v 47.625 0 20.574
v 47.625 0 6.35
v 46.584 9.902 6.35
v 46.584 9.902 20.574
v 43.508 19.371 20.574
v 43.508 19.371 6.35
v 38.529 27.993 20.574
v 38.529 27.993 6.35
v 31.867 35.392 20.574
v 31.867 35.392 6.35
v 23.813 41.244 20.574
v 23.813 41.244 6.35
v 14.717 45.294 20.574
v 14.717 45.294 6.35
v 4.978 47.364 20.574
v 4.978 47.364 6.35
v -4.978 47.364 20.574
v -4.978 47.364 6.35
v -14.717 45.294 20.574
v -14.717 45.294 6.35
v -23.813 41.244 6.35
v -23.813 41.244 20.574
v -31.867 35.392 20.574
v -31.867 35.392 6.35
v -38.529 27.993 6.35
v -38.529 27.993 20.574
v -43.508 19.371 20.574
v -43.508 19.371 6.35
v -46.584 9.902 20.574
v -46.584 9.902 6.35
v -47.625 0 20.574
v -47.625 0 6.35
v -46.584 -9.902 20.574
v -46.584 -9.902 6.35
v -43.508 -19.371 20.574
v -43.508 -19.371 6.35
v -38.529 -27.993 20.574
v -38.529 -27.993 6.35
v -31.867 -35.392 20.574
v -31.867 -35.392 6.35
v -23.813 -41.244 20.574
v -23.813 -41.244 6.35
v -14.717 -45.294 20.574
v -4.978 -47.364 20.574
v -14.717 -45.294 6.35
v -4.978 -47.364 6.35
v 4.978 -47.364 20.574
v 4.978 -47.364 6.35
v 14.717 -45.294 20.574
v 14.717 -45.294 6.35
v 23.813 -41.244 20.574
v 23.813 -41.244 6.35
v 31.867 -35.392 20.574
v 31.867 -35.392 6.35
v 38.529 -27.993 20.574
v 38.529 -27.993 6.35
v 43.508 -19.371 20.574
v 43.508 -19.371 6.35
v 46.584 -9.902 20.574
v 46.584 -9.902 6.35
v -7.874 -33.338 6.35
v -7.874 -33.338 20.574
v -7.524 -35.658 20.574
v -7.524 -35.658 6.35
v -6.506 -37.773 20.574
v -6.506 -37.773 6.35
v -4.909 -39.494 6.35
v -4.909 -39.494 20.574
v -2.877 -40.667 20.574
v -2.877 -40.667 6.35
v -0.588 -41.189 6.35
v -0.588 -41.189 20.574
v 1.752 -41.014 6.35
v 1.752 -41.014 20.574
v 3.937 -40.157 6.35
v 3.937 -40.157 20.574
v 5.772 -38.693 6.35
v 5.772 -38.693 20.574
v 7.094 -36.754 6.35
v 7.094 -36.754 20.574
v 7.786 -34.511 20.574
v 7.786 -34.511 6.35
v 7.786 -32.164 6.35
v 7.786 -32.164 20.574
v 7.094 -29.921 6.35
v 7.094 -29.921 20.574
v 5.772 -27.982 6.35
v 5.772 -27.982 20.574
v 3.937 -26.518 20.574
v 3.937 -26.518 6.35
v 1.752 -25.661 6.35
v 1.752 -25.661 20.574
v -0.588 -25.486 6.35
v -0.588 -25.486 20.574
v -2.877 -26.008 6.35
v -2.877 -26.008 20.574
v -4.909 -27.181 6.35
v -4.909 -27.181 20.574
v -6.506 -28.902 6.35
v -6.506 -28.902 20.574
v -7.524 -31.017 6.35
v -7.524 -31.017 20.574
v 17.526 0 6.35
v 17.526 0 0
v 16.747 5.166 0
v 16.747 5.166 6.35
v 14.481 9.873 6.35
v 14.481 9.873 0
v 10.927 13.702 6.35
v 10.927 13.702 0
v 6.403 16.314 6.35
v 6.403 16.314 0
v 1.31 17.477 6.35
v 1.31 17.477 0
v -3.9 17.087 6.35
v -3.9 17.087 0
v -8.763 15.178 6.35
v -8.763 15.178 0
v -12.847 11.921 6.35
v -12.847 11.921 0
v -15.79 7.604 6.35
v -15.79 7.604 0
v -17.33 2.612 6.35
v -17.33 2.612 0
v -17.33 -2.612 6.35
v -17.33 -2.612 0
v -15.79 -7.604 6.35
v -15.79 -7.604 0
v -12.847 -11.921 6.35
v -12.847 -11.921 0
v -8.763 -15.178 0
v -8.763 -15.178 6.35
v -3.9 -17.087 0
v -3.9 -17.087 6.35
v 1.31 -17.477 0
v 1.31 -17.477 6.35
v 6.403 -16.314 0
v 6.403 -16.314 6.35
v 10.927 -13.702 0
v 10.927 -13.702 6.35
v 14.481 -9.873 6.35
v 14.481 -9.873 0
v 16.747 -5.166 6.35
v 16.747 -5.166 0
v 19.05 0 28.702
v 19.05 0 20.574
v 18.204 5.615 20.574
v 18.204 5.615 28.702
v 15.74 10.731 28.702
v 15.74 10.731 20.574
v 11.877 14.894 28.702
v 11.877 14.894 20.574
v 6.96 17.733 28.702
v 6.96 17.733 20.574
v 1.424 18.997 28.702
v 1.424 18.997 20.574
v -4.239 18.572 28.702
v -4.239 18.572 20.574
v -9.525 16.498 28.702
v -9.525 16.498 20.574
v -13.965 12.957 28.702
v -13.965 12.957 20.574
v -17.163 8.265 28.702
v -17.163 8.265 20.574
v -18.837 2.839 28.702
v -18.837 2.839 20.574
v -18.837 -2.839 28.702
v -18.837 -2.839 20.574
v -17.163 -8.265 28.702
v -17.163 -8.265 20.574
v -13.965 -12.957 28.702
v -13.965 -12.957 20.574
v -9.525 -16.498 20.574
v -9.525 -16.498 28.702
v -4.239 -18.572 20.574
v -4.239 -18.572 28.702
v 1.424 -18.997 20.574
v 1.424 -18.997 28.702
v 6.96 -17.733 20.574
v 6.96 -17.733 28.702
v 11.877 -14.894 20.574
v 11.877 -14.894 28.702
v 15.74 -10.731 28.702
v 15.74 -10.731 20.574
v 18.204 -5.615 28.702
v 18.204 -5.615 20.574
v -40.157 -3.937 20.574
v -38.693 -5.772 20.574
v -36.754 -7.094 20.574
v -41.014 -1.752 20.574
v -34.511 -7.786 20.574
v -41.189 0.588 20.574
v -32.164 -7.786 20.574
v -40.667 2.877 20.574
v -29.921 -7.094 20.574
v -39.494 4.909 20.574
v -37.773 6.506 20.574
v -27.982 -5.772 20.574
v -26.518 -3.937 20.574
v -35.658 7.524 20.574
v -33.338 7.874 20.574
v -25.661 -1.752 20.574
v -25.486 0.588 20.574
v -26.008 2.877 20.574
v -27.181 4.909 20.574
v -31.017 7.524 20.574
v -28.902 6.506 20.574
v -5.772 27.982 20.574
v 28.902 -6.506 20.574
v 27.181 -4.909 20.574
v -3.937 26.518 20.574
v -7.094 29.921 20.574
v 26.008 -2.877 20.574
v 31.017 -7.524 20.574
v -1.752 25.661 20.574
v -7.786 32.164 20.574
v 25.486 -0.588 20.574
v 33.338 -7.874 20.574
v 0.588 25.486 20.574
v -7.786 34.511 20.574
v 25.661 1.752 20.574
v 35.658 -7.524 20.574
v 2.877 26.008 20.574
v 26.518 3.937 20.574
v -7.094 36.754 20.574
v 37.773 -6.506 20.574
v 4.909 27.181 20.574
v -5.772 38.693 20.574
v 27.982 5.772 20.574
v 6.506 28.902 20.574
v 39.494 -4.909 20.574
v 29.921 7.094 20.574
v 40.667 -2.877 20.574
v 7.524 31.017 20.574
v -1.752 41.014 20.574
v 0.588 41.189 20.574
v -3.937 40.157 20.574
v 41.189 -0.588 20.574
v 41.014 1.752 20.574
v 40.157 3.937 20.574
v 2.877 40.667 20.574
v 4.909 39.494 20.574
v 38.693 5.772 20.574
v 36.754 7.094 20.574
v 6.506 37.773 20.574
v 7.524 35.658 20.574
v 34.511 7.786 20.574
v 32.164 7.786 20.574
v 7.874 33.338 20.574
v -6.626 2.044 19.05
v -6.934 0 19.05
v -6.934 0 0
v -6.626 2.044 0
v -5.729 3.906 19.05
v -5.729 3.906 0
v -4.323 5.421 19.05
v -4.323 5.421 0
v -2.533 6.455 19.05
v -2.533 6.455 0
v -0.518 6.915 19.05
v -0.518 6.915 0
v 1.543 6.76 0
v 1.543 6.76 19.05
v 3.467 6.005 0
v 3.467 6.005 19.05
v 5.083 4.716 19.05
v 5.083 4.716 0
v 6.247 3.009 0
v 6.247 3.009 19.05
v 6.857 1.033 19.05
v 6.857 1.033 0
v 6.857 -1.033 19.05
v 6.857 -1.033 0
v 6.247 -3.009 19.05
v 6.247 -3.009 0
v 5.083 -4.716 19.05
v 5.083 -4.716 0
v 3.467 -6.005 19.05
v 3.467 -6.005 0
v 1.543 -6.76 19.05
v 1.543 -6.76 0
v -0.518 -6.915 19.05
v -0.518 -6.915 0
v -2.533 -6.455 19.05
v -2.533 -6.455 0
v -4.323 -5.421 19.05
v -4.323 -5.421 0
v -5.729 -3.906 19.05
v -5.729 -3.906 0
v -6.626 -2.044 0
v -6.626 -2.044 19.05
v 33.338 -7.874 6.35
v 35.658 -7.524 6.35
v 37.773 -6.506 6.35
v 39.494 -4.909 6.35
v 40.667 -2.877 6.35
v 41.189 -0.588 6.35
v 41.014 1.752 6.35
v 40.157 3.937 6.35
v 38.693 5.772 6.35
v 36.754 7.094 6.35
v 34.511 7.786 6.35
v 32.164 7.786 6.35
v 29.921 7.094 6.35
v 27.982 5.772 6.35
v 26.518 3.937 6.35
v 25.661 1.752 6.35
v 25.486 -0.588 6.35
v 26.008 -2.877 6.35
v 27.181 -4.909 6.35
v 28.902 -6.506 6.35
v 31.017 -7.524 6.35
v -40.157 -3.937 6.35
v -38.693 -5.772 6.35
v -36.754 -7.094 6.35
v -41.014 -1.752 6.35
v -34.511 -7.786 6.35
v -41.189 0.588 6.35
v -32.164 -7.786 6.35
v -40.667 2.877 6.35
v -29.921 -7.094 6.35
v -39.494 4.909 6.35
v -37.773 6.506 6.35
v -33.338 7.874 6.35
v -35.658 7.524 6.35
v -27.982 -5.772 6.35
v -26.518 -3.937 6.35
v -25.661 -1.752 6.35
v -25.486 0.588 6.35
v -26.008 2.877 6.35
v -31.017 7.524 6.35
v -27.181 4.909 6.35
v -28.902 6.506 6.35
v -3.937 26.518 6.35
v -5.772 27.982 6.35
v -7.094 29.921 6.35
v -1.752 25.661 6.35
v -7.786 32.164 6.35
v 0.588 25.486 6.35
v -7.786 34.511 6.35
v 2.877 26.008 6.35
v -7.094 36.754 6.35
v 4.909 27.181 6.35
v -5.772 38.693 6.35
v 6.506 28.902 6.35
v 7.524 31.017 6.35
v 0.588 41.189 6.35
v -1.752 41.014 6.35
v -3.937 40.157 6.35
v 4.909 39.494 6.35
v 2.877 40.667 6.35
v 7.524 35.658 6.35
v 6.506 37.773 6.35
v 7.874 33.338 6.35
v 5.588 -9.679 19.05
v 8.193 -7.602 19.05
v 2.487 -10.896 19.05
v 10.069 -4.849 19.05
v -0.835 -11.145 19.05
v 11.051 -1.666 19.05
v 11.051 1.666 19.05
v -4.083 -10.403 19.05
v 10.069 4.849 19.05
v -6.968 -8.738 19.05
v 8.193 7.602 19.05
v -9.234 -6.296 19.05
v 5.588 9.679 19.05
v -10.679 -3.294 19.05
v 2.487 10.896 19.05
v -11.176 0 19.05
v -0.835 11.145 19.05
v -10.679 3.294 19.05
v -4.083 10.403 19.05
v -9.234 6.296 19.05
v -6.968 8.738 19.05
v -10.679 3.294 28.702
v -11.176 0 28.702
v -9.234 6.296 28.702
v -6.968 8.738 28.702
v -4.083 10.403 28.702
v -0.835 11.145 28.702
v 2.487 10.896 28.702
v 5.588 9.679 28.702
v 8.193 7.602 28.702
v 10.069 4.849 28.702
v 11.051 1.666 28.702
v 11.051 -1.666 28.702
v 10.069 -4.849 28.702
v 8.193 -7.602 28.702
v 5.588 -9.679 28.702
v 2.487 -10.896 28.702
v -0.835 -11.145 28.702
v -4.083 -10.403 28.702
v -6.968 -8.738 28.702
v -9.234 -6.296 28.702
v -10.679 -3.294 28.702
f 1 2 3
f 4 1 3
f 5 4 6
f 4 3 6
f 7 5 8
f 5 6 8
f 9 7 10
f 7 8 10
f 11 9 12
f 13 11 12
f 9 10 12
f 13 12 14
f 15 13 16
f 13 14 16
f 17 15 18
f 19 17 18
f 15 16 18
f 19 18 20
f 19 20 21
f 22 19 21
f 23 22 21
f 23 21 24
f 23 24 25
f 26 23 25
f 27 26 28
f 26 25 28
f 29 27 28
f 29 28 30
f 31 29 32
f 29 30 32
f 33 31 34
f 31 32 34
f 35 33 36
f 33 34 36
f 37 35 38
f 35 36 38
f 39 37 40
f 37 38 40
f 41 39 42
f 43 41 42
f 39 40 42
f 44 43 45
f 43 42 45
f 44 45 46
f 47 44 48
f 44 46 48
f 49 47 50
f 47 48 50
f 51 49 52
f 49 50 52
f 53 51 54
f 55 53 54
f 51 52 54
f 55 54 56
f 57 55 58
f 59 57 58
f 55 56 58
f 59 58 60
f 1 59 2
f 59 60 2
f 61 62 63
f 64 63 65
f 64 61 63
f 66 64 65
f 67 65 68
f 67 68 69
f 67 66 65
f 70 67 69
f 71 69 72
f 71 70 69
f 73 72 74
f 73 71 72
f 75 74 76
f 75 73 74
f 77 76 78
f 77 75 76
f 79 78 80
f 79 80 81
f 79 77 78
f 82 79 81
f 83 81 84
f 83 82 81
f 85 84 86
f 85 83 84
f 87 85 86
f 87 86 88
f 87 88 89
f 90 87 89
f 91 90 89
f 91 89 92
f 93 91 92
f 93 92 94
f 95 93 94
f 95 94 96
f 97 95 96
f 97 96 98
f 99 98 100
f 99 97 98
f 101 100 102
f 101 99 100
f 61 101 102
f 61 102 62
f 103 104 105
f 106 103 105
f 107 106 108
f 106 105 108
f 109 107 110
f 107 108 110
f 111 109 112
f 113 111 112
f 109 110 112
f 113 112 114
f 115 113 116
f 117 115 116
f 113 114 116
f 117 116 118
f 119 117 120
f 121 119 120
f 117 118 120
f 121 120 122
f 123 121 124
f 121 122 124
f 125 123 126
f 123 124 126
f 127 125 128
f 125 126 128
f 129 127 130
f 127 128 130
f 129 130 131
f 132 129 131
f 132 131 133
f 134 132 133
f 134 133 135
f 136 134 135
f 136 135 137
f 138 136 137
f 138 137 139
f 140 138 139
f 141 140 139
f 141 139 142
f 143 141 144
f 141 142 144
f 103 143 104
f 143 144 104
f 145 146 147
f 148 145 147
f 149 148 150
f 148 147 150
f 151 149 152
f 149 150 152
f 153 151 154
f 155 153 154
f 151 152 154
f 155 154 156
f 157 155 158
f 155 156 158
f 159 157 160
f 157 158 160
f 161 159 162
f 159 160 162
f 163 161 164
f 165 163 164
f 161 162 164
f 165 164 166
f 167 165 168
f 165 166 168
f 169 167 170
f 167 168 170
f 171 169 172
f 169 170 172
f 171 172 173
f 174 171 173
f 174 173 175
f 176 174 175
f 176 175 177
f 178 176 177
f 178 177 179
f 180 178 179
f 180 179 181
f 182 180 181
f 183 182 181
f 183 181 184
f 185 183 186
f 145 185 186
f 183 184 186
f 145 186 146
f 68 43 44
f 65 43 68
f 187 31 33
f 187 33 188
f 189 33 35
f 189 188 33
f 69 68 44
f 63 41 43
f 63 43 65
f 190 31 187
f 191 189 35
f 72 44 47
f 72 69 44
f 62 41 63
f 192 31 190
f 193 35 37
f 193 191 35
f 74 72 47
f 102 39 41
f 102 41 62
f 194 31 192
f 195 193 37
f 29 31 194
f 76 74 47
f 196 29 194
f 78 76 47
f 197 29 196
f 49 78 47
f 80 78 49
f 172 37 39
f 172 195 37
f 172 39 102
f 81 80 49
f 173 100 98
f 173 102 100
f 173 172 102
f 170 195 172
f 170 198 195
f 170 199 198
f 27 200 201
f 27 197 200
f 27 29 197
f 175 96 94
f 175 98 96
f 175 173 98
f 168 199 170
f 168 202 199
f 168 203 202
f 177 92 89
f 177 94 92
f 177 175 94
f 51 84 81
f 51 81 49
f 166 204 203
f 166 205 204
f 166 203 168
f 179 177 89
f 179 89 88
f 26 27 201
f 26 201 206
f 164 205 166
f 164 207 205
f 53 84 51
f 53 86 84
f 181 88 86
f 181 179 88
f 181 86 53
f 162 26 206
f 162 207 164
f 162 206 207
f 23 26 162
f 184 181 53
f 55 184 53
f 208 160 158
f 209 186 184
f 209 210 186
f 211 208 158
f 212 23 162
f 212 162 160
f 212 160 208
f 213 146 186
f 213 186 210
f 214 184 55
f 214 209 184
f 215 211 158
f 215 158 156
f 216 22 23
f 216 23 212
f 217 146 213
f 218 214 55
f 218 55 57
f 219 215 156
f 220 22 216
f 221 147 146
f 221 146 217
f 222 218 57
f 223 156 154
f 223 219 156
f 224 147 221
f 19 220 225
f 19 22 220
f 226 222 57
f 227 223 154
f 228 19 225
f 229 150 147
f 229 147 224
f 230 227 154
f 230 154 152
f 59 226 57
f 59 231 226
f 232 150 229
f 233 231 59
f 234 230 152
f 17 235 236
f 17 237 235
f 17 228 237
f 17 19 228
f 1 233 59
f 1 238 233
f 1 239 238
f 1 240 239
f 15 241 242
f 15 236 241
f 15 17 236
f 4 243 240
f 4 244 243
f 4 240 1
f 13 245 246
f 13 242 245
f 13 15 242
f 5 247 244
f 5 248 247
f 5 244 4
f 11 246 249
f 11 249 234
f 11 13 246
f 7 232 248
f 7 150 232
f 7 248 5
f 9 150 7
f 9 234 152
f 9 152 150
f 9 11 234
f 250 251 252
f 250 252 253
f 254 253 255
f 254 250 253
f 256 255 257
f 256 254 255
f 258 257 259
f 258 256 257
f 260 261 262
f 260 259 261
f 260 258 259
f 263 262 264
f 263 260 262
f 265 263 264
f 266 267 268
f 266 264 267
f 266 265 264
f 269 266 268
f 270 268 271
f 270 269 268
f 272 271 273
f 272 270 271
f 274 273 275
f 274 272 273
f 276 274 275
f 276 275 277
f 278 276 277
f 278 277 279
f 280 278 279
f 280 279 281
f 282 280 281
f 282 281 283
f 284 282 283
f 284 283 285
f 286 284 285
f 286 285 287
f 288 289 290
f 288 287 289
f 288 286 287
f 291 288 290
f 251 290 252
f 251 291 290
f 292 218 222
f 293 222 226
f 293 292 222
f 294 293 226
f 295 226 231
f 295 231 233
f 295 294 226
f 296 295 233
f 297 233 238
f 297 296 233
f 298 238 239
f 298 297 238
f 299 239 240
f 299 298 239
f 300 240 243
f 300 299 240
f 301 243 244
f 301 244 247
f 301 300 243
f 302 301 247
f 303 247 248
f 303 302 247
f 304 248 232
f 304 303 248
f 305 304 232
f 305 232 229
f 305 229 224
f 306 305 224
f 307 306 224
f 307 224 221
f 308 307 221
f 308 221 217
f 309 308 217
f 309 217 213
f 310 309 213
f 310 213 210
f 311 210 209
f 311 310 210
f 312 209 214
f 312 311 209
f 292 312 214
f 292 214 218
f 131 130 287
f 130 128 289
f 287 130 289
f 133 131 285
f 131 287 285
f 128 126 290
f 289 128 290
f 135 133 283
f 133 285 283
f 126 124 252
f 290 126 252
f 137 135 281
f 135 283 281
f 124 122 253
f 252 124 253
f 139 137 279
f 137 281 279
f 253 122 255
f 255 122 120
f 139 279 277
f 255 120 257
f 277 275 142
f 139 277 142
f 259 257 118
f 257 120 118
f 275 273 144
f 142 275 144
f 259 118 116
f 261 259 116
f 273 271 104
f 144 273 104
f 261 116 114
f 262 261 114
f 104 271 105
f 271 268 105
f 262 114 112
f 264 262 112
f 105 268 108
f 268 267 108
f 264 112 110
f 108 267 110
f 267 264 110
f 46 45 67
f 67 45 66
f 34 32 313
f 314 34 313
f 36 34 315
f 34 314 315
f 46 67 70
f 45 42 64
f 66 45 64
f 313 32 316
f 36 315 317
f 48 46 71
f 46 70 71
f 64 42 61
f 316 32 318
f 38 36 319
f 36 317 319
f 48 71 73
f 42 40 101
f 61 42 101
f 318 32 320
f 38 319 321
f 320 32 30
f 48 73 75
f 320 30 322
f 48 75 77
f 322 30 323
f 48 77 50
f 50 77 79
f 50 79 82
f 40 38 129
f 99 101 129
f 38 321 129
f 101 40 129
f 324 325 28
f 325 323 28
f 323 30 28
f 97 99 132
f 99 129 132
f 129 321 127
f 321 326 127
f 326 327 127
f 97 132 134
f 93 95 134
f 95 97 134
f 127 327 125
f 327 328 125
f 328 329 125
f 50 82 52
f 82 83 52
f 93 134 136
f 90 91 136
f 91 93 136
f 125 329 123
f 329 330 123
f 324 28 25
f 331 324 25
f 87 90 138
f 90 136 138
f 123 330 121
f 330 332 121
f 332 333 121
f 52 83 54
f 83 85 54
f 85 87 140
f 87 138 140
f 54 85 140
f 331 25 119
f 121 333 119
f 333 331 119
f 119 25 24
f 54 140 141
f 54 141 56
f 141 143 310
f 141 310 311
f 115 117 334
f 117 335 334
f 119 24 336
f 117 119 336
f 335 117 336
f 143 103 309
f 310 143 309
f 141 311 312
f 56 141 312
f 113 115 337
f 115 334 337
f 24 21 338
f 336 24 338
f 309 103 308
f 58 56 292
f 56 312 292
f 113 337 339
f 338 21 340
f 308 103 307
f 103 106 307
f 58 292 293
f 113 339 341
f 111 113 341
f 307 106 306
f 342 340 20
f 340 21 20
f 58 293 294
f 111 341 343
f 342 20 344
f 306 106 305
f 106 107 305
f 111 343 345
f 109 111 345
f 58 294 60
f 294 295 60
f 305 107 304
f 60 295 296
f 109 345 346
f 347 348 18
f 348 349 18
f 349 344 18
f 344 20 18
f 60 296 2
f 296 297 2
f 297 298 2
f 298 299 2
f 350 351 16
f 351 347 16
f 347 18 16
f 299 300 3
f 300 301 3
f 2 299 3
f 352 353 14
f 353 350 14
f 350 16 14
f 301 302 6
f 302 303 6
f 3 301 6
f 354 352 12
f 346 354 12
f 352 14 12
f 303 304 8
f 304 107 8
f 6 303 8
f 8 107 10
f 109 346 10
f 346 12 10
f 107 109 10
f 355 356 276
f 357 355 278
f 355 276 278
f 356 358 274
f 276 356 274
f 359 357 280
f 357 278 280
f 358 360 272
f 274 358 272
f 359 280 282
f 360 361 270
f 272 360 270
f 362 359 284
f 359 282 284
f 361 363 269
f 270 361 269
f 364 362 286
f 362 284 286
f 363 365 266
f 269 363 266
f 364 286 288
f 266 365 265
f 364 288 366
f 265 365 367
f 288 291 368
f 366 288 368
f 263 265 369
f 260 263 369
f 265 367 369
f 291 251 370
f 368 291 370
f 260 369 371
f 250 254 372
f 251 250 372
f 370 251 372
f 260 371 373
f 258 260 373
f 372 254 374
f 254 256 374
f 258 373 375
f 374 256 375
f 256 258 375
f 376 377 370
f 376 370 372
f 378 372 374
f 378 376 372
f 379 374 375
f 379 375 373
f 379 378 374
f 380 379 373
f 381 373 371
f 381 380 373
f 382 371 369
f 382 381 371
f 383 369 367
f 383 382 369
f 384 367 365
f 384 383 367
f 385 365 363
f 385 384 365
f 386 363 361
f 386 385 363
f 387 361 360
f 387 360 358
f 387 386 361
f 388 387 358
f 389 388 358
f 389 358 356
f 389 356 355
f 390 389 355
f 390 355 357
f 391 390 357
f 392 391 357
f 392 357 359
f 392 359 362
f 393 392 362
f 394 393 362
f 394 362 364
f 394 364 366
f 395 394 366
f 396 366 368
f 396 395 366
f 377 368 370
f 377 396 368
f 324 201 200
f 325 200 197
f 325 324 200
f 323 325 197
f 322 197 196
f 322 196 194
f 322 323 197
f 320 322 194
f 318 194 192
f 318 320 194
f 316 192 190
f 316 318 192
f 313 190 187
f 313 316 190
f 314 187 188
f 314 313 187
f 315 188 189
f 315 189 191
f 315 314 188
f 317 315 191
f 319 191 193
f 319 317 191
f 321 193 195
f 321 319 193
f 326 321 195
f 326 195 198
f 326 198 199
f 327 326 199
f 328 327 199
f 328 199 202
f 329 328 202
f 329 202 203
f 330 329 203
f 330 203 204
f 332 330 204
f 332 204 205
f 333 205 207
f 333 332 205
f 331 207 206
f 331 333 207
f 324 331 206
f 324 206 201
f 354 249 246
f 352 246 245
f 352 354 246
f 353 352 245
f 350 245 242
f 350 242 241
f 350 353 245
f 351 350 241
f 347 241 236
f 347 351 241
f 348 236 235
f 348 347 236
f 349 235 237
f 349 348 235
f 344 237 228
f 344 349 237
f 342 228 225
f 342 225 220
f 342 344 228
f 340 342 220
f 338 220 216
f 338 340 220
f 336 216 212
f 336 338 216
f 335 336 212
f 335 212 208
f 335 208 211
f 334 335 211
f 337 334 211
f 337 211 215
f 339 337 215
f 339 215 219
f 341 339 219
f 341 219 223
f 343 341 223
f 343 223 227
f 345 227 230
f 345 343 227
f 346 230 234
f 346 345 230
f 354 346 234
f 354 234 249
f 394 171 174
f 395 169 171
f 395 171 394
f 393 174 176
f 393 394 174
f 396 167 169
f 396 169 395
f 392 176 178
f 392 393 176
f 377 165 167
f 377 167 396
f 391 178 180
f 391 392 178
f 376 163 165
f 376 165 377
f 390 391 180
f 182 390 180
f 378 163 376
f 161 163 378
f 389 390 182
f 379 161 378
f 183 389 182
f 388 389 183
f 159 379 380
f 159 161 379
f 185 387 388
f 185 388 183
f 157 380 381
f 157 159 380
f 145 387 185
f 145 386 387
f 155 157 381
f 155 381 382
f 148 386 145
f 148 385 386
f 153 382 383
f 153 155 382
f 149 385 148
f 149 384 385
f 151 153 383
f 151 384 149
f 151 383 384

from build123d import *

# Parameters (mm, degrees)
SKETCH1_R         = 17.526
EXTRUDE1_DEPTH    = 6.35
EXTRUDE2_START    = 6.35
SKETCH1_3_R       = 47.625
EXTRUDE2_DEPTH    = 14.224
EXTRUDE3_START    = 20.574
SKETCH1_4_R       = 19.05
EXTRUDE3_DEPTH    = 8.128
EXTRUDE4_START    = 6.35
SKETCH1_5_R       = 7.874
EXTRUDE4_DEPTH    = 14.224
CIRPATTERN1_COUNT = 4
SKETCH3_R         = 11.176
EXTRUDE5_DEPTH    = 9.652
EXTRUDE6_REACH    = 30.702
SKETCH3_3_R       = 6.9342


with BuildPart() as part:
    # Sketch1 → Extrude1 (new body)
    with BuildSketch(Plane.XY):
        Circle(SKETCH1_R)
    extrude(amount=EXTRUDE1_DEPTH)

    # Sketch1<3> → Extrude2 (add)
    with BuildSketch(Plane.XY.offset(EXTRUDE2_START)):
        Circle(SKETCH1_3_R)
    extrude(amount=EXTRUDE2_DEPTH)

    # Sketch1<4> → Extrude3 (add)
    with BuildSketch(Plane.XY.offset(EXTRUDE3_START)):
        Circle(SKETCH1_4_R)
    extrude(amount=EXTRUDE3_DEPTH)

    # Sketch1<5> → Extrude4 (cut)
    with BuildSketch(Plane.XY.offset(EXTRUDE4_START)):
        with Locations((0, 33.3375)):
            Circle(SKETCH1_5_R)
    extrude4 = extrude(amount=EXTRUDE4_DEPTH, mode=Mode.SUBTRACT)

    # CirPattern1: Extrude4 ×4 about axis
    cirpattern1_axis = Axis((0, 0, 0), (0, 0, 1))
    for i in range(1, CIRPATTERN1_COUNT):
        add(extrude4.rotate(cirpattern1_axis, i * 360 / CIRPATTERN1_COUNT), mode=Mode.SUBTRACT)

    # Sketch3 → Extrude5 (cut)
    with BuildSketch(Plane(origin=(0, 0, 28.702), x_dir=(-1, 0, 0), z_dir=(0, 0, -1))):
        Circle(SKETCH3_R)
    extrude(amount=EXTRUDE5_DEPTH, mode=Mode.SUBTRACT)

    # Sketch3<3> → Extrude6 (cut, up to next)
    with BuildSketch(Plane(origin=(0, 0, 28.702), x_dir=(-1, 0, 0), z_dir=(0, 0, -1)), mode=Mode.PRIVATE) as extrude6_sk1:
        Circle(SKETCH3_3_R)
    extrude6_tool1 = extrude(extrude6_sk1.sketch, amount=EXTRUDE6_REACH, mode=Mode.PRIVATE) & part.part
    add(extrude6_tool1.solids().sort_by_distance((0, 0, 28.702))[0], mode=Mode.SUBTRACT)


solid = part.part
